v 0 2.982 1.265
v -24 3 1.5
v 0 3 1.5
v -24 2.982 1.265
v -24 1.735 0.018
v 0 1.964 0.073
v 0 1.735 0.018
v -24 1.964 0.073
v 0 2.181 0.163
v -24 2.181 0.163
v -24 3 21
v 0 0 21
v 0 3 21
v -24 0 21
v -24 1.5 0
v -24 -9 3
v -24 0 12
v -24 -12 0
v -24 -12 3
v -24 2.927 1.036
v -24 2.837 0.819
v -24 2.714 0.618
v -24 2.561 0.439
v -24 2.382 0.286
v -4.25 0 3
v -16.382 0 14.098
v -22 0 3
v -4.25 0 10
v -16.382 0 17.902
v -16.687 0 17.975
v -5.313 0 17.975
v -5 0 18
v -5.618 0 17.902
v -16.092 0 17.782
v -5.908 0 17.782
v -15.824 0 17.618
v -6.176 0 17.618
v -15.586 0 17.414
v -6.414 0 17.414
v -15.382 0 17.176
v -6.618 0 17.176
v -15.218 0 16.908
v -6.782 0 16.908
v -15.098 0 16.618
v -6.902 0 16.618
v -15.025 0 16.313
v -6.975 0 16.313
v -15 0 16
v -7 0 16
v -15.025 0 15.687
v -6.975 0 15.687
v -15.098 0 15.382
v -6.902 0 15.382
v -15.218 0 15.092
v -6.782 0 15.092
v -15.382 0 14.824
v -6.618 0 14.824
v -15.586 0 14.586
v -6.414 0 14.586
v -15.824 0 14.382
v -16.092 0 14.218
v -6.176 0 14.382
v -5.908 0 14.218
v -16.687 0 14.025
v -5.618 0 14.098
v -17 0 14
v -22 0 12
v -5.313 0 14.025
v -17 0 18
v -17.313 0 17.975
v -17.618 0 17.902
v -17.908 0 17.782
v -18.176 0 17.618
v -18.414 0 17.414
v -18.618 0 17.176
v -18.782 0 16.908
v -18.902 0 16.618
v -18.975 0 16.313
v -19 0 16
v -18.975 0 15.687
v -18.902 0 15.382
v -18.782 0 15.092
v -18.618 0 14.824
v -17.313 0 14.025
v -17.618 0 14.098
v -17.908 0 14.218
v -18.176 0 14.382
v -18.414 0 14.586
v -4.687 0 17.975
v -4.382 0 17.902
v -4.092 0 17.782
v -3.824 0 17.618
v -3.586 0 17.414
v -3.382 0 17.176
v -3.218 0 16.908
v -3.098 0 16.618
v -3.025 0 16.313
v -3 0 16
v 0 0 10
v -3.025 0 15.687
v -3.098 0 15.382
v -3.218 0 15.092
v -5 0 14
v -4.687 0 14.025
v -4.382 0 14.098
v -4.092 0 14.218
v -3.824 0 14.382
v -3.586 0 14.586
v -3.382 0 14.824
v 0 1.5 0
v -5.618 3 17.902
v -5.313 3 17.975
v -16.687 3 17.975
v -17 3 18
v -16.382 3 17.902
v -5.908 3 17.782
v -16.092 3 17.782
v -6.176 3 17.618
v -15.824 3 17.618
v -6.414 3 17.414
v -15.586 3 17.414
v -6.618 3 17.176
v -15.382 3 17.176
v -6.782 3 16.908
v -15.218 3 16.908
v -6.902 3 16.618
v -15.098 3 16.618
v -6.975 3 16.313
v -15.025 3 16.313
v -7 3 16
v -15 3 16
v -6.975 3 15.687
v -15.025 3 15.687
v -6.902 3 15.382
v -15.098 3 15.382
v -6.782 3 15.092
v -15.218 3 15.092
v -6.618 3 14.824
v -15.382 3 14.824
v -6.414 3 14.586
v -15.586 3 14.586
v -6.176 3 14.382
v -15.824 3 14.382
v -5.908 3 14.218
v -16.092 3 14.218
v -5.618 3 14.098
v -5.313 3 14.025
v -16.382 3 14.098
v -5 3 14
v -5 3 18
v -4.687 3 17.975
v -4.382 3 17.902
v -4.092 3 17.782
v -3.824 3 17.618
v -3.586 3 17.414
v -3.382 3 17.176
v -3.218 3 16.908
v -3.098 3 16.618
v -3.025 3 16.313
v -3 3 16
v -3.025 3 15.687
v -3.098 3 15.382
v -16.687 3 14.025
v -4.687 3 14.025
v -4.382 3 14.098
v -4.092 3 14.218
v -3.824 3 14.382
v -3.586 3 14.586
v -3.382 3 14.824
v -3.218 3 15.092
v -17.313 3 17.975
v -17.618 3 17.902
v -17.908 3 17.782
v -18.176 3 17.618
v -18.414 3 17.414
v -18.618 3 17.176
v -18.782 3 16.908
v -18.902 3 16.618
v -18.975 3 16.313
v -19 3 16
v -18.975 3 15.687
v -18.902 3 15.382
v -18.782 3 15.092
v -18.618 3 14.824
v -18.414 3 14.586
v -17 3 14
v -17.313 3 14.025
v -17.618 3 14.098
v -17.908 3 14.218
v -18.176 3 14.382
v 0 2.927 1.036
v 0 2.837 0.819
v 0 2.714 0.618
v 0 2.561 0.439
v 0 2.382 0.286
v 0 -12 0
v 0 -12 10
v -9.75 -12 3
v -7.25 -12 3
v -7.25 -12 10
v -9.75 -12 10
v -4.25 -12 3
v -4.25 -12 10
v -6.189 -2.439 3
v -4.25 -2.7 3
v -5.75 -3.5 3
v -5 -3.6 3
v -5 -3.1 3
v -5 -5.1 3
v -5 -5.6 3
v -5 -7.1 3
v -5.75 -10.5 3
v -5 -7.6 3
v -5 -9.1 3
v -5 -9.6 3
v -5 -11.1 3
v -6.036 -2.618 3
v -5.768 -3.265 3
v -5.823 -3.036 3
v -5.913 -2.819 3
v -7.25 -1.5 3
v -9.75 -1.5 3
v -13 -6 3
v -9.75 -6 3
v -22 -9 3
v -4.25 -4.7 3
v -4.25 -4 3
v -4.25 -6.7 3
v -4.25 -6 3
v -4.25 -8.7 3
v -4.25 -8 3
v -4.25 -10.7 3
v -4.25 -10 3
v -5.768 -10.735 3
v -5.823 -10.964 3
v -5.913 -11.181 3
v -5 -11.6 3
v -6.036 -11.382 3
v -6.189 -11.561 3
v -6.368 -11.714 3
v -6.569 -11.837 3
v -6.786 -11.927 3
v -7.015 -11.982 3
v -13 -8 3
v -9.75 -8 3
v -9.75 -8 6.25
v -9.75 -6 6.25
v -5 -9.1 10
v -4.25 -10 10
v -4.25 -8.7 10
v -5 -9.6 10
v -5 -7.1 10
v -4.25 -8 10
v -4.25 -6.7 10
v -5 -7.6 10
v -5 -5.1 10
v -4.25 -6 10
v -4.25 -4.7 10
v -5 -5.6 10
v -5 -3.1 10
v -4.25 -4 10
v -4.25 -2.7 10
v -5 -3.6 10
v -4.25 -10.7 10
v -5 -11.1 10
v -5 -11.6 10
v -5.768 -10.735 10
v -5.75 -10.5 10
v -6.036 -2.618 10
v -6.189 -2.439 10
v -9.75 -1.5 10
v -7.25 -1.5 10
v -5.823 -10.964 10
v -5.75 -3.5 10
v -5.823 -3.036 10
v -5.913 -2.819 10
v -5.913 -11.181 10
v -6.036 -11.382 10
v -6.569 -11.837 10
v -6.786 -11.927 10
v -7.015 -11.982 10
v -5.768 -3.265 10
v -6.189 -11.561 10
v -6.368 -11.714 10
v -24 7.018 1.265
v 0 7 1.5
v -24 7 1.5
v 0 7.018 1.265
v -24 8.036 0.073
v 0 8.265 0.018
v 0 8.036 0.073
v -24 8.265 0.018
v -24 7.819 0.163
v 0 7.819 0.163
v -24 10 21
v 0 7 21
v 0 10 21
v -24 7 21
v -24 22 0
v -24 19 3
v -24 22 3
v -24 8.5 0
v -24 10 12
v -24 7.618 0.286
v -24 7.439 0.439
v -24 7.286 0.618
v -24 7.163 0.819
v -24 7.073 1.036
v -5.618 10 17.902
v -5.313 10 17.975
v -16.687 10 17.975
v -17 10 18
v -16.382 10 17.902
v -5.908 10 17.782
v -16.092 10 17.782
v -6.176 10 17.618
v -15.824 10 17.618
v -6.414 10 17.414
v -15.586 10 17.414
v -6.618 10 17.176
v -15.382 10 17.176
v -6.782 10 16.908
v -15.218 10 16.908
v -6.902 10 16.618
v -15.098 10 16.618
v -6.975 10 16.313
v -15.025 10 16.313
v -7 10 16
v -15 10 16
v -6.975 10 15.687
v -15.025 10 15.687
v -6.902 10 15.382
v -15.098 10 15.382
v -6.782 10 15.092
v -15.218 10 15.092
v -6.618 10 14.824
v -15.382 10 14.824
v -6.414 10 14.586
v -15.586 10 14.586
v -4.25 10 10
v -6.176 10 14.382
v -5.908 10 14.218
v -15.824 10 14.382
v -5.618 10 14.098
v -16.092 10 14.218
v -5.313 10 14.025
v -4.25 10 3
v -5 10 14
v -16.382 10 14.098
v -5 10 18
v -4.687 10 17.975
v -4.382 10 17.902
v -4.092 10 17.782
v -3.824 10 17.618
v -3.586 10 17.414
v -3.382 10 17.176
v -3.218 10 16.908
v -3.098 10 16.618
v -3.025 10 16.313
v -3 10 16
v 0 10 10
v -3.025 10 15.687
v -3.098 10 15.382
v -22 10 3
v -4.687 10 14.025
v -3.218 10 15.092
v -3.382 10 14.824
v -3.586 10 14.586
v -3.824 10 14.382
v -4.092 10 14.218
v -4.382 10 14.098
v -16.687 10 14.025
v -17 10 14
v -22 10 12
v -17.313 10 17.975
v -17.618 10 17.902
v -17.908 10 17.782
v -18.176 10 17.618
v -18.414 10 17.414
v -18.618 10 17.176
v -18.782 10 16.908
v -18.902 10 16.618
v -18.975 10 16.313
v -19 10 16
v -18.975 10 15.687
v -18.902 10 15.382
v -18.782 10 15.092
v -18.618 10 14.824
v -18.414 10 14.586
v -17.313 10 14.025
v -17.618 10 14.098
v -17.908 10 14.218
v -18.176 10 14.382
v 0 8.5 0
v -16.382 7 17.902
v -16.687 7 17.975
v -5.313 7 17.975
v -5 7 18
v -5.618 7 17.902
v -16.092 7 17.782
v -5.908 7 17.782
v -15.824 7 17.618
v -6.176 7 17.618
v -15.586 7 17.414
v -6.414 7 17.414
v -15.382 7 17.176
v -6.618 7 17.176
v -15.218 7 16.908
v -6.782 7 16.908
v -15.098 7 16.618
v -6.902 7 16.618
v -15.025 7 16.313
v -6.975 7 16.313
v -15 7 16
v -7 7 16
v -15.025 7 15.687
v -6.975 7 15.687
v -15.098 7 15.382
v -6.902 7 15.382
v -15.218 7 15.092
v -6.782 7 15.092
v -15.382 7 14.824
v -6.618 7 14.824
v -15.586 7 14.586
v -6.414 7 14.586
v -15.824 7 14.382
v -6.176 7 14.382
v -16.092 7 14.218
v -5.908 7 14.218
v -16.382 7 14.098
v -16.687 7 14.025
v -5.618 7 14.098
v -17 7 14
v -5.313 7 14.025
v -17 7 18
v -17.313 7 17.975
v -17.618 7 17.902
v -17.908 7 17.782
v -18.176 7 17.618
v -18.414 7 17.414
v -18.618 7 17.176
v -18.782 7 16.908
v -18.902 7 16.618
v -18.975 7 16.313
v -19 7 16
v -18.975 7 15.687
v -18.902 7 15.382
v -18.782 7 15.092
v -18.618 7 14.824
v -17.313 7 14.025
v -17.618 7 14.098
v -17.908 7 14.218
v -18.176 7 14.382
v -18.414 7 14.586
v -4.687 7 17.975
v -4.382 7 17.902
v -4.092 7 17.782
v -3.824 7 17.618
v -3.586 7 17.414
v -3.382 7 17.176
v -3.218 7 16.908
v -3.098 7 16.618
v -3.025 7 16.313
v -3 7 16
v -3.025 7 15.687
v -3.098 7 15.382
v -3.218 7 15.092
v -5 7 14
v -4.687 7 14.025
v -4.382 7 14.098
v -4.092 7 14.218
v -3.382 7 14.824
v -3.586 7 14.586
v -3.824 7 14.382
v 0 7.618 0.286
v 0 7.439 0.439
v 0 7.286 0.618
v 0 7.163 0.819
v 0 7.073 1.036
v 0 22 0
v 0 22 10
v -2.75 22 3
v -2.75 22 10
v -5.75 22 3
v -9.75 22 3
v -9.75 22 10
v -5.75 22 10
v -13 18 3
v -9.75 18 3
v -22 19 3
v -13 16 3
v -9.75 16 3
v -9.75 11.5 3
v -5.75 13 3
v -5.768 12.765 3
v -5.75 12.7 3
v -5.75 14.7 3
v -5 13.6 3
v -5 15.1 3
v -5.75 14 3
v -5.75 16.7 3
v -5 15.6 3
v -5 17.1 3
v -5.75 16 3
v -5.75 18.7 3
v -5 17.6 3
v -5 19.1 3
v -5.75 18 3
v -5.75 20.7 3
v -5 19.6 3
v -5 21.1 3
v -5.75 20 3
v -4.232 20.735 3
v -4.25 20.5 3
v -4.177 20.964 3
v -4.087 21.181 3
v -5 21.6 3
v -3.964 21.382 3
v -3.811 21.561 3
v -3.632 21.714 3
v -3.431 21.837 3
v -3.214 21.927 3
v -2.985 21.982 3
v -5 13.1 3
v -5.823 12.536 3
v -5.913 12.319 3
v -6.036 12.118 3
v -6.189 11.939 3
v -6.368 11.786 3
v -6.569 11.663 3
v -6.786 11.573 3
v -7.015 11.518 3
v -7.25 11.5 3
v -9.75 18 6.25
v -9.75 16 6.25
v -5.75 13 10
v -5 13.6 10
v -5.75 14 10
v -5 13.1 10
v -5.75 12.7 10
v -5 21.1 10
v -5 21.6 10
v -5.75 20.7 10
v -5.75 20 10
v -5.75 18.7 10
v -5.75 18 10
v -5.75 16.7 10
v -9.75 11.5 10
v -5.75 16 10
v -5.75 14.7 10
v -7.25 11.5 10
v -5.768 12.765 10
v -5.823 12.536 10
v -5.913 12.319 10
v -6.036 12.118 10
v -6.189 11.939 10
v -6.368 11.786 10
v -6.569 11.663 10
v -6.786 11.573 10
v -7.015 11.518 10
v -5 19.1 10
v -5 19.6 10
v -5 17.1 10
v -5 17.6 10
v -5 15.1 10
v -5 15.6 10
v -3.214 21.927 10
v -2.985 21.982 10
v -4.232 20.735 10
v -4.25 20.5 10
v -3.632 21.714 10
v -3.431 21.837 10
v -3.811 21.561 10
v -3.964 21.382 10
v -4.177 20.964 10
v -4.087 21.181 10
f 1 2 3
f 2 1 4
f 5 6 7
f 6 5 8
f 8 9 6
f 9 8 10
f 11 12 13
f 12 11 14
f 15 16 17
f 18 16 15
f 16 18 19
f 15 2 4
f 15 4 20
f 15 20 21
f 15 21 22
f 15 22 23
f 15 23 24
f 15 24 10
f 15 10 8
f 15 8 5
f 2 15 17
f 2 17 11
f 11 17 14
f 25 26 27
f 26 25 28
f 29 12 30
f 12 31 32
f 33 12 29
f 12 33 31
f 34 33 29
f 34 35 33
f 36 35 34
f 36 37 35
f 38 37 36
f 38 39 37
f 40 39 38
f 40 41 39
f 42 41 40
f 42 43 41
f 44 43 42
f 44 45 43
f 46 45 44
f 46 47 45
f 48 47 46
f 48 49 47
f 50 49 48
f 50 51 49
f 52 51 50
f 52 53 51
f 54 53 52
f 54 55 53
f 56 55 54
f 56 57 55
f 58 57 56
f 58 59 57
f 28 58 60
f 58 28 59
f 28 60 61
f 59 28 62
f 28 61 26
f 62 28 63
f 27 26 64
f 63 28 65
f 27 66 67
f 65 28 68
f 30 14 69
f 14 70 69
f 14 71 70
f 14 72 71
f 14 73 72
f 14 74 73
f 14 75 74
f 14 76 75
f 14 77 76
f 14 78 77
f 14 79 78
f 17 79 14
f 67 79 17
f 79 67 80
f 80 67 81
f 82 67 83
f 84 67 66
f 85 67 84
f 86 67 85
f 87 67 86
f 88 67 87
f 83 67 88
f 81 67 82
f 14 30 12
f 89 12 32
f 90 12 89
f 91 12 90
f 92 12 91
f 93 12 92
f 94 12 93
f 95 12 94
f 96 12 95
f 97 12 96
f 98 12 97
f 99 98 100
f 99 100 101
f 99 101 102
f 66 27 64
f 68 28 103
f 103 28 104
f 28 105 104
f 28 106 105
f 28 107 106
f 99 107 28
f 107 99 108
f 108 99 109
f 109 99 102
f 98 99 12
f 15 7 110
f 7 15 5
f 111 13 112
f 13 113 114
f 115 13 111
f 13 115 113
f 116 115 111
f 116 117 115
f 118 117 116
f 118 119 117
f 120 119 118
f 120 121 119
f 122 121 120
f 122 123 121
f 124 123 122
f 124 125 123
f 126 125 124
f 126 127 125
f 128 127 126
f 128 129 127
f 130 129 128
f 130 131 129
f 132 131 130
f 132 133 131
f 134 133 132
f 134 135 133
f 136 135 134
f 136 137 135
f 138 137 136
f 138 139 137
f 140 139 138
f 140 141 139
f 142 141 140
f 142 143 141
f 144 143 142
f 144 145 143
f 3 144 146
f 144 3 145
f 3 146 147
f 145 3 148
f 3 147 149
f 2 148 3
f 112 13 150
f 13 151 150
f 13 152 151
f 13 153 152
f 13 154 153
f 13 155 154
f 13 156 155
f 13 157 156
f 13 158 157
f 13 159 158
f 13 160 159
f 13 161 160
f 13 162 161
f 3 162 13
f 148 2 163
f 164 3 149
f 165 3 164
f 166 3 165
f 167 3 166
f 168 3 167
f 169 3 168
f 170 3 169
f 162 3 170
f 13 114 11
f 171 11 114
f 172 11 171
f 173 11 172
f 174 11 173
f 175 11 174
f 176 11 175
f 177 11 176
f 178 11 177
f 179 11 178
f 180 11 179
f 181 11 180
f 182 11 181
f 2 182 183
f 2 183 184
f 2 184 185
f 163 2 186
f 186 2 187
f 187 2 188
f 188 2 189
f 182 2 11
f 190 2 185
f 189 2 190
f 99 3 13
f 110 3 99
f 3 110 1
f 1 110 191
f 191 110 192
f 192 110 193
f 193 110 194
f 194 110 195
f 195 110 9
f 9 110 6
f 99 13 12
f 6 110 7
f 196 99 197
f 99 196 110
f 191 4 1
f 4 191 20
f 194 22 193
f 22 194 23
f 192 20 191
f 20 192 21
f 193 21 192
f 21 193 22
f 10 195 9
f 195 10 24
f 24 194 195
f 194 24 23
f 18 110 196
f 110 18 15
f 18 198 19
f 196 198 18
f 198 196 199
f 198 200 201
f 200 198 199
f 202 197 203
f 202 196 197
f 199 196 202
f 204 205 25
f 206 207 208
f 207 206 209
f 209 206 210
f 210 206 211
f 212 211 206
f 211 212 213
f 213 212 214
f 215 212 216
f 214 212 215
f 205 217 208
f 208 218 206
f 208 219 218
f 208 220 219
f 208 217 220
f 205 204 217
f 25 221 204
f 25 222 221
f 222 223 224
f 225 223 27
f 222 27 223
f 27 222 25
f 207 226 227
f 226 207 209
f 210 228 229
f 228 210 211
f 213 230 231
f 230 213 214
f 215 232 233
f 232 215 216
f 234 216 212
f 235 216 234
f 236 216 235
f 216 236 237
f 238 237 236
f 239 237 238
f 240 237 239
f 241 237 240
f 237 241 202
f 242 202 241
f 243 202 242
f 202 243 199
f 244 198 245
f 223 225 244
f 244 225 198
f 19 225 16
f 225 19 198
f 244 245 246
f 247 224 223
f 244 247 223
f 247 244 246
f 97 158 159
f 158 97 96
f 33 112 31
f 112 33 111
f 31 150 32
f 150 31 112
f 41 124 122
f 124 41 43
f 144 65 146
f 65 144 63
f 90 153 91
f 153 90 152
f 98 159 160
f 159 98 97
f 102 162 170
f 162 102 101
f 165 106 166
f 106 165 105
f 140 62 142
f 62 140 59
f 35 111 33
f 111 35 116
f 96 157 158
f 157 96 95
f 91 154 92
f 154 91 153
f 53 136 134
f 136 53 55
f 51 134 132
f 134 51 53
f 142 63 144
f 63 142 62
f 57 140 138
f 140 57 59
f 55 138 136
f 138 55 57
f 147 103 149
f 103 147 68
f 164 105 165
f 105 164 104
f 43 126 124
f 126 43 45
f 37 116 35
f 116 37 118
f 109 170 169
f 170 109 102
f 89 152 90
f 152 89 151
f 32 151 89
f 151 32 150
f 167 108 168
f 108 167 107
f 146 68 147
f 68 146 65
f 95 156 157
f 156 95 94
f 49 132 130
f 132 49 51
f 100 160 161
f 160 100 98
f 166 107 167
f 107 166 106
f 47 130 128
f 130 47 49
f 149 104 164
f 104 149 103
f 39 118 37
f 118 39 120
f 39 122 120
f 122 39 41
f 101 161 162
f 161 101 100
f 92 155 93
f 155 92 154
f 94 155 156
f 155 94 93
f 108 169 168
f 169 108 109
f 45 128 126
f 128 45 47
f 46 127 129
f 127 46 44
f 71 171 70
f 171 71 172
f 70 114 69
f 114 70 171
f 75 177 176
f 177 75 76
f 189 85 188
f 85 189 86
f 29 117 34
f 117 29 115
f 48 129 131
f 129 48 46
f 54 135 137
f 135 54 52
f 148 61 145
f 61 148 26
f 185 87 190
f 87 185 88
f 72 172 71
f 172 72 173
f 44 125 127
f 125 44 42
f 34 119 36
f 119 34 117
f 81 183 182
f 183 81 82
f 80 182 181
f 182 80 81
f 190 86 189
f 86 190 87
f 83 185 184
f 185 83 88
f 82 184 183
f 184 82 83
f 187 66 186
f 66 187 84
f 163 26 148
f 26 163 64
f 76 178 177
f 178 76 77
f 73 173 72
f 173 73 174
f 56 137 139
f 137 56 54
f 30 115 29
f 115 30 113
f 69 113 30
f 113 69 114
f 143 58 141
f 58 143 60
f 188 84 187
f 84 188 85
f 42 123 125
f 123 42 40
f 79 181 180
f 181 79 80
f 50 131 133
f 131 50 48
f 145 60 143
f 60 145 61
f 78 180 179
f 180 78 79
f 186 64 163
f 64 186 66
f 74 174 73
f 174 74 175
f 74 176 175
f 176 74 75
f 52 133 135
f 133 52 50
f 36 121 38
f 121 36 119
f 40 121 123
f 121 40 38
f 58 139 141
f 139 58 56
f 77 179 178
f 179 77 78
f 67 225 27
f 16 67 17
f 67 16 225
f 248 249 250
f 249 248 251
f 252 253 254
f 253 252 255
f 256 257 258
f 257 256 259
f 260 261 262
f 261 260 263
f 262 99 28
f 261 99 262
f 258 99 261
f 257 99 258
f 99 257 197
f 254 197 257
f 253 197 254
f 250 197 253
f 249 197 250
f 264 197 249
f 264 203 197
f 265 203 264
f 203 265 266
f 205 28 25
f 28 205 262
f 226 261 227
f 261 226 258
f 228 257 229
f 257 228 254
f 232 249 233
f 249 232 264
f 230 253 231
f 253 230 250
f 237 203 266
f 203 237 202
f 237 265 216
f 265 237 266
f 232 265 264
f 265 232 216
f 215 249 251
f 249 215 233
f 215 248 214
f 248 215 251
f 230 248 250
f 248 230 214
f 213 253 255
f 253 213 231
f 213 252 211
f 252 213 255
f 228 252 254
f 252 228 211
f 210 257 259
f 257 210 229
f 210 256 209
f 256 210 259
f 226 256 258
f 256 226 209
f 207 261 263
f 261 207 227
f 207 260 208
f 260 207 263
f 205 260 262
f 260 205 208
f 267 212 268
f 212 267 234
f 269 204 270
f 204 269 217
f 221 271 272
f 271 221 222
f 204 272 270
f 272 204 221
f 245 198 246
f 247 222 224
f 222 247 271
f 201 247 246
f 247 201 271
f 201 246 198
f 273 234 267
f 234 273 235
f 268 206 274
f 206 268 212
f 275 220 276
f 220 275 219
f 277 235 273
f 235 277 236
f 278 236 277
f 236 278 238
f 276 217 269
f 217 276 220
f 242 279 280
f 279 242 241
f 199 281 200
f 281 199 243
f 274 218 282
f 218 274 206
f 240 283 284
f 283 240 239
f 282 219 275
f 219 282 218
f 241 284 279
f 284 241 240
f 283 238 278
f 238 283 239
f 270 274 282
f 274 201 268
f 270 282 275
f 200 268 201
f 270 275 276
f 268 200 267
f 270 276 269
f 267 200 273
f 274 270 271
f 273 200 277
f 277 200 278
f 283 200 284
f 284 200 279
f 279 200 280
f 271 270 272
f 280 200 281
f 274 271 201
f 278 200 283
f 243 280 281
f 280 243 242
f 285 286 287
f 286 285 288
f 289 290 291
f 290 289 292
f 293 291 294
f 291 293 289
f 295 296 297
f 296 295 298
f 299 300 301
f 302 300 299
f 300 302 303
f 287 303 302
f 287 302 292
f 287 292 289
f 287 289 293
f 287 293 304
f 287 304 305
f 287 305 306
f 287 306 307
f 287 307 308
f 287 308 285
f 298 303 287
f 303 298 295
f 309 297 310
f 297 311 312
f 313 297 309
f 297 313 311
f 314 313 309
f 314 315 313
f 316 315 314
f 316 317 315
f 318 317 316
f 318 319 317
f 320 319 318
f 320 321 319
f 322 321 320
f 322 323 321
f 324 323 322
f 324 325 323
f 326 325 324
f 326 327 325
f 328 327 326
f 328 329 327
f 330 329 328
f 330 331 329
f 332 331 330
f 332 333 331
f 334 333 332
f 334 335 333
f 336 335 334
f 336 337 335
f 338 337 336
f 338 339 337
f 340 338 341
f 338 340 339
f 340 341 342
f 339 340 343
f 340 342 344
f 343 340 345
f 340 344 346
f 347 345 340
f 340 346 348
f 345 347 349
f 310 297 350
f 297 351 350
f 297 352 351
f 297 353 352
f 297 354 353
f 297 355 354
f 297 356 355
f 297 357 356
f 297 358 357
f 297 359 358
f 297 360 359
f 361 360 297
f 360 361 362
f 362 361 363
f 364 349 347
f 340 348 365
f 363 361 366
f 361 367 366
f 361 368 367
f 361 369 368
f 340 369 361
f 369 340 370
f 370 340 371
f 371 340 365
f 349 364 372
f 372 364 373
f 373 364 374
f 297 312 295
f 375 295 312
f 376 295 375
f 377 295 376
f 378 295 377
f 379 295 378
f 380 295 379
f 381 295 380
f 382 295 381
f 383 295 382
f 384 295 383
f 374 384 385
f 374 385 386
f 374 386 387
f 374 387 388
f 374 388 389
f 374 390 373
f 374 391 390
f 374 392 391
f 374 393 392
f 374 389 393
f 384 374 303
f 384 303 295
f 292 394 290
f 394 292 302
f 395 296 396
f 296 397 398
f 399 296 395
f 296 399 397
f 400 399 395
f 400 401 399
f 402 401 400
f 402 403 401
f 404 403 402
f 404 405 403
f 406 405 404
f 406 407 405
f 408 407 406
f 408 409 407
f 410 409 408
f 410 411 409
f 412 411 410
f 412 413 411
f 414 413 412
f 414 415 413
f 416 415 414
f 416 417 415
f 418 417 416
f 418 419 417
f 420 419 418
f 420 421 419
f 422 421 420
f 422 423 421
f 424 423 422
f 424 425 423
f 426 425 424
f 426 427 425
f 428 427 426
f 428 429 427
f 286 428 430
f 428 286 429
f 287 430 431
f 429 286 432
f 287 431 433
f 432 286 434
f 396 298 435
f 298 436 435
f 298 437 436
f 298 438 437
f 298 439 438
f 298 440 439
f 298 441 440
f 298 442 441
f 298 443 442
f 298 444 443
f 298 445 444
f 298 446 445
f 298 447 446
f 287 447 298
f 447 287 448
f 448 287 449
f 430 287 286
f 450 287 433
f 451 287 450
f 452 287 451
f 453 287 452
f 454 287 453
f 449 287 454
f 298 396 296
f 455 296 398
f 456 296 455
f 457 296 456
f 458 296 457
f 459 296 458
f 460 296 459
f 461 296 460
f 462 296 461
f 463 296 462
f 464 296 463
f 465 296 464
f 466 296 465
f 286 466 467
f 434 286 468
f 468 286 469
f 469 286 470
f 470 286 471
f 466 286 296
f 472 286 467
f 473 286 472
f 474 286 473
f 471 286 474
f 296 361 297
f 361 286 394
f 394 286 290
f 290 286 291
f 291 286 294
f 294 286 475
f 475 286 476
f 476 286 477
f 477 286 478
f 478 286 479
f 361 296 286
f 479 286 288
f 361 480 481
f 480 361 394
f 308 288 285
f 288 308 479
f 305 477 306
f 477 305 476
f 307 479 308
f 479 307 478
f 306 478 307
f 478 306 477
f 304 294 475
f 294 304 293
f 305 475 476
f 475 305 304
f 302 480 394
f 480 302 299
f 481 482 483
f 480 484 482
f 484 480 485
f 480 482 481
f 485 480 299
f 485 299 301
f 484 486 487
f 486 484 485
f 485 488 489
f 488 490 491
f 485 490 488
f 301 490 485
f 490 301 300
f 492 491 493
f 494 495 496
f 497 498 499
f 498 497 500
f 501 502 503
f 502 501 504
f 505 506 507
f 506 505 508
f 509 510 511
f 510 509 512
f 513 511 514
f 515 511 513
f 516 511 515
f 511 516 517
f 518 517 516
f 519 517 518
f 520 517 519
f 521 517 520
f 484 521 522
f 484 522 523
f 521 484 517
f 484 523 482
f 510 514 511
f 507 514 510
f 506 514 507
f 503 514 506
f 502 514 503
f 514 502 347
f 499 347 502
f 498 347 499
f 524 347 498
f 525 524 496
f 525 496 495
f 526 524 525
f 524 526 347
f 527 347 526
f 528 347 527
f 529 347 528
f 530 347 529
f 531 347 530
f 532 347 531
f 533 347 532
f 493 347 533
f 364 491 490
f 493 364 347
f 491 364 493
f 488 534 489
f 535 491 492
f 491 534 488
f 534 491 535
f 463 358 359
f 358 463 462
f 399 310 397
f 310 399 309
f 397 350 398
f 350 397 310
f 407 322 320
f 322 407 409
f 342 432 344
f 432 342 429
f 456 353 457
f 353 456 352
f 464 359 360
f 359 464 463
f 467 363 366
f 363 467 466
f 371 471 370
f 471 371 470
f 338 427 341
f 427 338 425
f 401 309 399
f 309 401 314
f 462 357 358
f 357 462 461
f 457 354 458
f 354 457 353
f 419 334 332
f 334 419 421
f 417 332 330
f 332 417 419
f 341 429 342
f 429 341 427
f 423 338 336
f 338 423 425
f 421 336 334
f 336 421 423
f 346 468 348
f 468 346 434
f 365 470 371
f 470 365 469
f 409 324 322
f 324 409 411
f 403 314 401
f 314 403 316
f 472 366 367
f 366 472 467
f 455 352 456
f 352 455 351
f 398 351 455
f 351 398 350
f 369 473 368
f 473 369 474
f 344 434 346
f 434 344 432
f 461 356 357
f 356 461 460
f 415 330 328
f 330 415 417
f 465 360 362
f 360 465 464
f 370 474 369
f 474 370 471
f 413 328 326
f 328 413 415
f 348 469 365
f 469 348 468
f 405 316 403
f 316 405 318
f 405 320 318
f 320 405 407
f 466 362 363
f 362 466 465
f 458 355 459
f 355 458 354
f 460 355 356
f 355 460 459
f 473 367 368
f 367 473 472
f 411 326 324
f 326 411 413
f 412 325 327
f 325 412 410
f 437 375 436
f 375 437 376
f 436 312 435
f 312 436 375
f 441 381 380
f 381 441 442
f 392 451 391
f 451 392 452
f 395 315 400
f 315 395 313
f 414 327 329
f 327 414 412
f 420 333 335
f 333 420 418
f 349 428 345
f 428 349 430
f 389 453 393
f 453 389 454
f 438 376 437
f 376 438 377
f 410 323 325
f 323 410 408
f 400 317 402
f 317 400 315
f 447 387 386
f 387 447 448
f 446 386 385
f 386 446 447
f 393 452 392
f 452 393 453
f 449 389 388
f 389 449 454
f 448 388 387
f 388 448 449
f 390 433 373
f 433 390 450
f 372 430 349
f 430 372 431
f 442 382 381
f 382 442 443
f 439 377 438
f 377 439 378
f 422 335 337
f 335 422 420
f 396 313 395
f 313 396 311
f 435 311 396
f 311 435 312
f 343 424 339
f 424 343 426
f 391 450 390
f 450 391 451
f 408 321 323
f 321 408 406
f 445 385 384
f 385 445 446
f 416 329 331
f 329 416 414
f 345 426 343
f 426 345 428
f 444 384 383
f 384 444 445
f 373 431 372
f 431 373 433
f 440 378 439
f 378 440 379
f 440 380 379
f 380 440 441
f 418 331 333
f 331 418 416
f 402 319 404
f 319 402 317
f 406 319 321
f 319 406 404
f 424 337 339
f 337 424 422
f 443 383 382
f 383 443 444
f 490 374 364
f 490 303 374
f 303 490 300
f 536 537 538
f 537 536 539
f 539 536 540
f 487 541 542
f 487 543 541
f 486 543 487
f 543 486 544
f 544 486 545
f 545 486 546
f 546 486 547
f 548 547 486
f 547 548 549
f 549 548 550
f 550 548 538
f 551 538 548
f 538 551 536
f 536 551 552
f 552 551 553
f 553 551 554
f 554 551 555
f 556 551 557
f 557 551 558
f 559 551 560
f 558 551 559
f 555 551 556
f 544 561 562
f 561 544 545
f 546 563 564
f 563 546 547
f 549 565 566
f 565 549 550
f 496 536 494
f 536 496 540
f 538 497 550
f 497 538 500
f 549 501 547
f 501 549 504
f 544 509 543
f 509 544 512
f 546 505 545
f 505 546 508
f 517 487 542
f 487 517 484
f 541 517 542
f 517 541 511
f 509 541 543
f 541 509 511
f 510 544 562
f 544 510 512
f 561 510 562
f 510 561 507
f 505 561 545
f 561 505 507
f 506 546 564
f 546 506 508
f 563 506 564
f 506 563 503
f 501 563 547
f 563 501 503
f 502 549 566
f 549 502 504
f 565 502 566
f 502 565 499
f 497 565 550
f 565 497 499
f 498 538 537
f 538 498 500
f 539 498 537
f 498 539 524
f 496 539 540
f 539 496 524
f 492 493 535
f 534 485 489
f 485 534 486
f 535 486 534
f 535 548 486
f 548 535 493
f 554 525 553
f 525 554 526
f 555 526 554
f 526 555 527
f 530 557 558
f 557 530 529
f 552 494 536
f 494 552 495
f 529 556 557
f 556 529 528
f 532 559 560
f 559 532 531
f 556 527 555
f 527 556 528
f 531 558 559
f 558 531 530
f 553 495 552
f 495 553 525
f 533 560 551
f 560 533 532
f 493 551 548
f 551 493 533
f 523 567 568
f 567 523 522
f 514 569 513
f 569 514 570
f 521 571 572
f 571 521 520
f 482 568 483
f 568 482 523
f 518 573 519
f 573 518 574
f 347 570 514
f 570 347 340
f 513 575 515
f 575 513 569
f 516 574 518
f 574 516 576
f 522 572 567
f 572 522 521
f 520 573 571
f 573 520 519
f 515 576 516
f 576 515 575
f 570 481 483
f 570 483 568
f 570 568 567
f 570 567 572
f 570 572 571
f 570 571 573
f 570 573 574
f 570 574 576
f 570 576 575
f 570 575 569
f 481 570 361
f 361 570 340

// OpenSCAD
$fn=40;
thick=3;
btmHole=5;
topHole=17;
h=24; //height

module cornerBrace(x,y,z) {
	polyhedron(
		points = [[0,0,0], [x,0,0], [0,y,0], [0,0,z], [x,0,z], [0,y,z]],
		triangles = [[0,2,1], [3,4,5], [0,3,5], [0,5,2], [1,4,3], [1,3,0], [2,5,4], [2,4,1]]
	);
} 
module tooth() {
	x = 1.3;
	y = 7;
	z= 0.75;
	a = 0.4;

	polyhedron(
		points=[[0,0,0] , [a,0,z] , [x-a,0,z] , [x,0,0] ,[0,y,0] , [a,y,z] , [x-a,y,z] , [x,y,0]],
		triangles=[[3,4,0],[3,7,4],  [1,5,2],[2,5,6],  [0,1,2],[0,2,3], [0,4,5], [0,5,1],  [7,6,5], [7,5,4],  [3,2,6], [3,6,7]
		]);
}
module backPlate(holeRad=2) {
	//back with 2 holes
	difference() { 
		union() {
		hull() {
			translate([thick,0,0]) cube([18,thick,h]);
			translate([1.5,1.5,0]) cylinder(h,1.5,1.5);
		}
		hull() {
			translate([0,-12,0]) cube([thick,12,h]);
			translate([1.5,1.5,0]) cylinder(h,1.5,1.5);
		}
		translate([3,-8,9]) rotate([-90,-90,0]) cornerBrace(4,4,2);		
		}
		union() {
			translate([16,4,btmHole]) rotate([90,0,0]) cylinder(thick+2,holeRad,holeRad); //screw hole
			translate([16,4,topHole]) rotate([90,0,0]) cylinder(thick+2,holeRad,holeRad); 
		}
	}
		rotate([0,0,-90]) translate([0,0,22]) cornerBrace(12,12,2);
}

module trapLeft (gap=1.5) {
	translate ([thick,-12,btmHole-4.25-(gap/2)]) cube([7,12,4.25]); //trap bottom
	hull() {
		translate ([thick,-12,btmHole+1.5+(gap/2)]) cube([7,10.5,2.5]);	//trap top
		translate ([thick,-10.5,btmHole+1.5+(gap/2)])  rotate([0,90,0]) cylinder(7,1.5,1.5);
		translate ([thick,-3.5,btmHole+1.5+(gap/2)]) rotate([0,90,0]) cylinder(7,1.5,1.5);
	}
	
	for (i = [0:4]) {
		translate([10,-12+(i*2),4.25]) {
			rotate([0,0,90]){
				tooth();
			}
		}
	}
}

module trapRight(gap=1.5) {
	rotate( [0,180,0])  translate([-13,0,-10]) {
	//hull() {
		translate ([thick,-12,btmHole-4-(gap/2)]) cube([7,9,4]); //trap bottom
		translate ([thick,-3,btmHole-3+(gap/2)])  rotate([0,90,0]) cylinder(7,1.5,1.5);
		translate ([thick,-3,btmHole-3+(gap/2)])  rotate([0,90,0]) cube([2.5,1.5,10]);
	//}
	hull() {
		translate ([thick,-12,btmHole+1.75+(gap/2)]) cube([9,12,2.5]);	//trap top
		translate ([thick,-10.5,btmHole+1.5+(gap/2)])  rotate([0,90,0]) cylinder(7,1.5,1.5);
		translate ([thick,-1,btmHole+1.5+(gap/2)]) rotate([0,90,0]) cube([1.5,1.5,10]);
	}
	
	for (i = [0:4]) {
		translate([10,-12+(i*2),4.25]) {
			rotate([0,0,90]){
				tooth();
			}
		}
	}
	}
}

rotate([0,-90,0]) {			
	//Left	Hand	
	backPlate();
	trapLeft();


	//Right Hand
	translate([0,10,0]) {
		mirror([0,1,0])  {
		backPlate();
		trapRight();
		}
	}
}
